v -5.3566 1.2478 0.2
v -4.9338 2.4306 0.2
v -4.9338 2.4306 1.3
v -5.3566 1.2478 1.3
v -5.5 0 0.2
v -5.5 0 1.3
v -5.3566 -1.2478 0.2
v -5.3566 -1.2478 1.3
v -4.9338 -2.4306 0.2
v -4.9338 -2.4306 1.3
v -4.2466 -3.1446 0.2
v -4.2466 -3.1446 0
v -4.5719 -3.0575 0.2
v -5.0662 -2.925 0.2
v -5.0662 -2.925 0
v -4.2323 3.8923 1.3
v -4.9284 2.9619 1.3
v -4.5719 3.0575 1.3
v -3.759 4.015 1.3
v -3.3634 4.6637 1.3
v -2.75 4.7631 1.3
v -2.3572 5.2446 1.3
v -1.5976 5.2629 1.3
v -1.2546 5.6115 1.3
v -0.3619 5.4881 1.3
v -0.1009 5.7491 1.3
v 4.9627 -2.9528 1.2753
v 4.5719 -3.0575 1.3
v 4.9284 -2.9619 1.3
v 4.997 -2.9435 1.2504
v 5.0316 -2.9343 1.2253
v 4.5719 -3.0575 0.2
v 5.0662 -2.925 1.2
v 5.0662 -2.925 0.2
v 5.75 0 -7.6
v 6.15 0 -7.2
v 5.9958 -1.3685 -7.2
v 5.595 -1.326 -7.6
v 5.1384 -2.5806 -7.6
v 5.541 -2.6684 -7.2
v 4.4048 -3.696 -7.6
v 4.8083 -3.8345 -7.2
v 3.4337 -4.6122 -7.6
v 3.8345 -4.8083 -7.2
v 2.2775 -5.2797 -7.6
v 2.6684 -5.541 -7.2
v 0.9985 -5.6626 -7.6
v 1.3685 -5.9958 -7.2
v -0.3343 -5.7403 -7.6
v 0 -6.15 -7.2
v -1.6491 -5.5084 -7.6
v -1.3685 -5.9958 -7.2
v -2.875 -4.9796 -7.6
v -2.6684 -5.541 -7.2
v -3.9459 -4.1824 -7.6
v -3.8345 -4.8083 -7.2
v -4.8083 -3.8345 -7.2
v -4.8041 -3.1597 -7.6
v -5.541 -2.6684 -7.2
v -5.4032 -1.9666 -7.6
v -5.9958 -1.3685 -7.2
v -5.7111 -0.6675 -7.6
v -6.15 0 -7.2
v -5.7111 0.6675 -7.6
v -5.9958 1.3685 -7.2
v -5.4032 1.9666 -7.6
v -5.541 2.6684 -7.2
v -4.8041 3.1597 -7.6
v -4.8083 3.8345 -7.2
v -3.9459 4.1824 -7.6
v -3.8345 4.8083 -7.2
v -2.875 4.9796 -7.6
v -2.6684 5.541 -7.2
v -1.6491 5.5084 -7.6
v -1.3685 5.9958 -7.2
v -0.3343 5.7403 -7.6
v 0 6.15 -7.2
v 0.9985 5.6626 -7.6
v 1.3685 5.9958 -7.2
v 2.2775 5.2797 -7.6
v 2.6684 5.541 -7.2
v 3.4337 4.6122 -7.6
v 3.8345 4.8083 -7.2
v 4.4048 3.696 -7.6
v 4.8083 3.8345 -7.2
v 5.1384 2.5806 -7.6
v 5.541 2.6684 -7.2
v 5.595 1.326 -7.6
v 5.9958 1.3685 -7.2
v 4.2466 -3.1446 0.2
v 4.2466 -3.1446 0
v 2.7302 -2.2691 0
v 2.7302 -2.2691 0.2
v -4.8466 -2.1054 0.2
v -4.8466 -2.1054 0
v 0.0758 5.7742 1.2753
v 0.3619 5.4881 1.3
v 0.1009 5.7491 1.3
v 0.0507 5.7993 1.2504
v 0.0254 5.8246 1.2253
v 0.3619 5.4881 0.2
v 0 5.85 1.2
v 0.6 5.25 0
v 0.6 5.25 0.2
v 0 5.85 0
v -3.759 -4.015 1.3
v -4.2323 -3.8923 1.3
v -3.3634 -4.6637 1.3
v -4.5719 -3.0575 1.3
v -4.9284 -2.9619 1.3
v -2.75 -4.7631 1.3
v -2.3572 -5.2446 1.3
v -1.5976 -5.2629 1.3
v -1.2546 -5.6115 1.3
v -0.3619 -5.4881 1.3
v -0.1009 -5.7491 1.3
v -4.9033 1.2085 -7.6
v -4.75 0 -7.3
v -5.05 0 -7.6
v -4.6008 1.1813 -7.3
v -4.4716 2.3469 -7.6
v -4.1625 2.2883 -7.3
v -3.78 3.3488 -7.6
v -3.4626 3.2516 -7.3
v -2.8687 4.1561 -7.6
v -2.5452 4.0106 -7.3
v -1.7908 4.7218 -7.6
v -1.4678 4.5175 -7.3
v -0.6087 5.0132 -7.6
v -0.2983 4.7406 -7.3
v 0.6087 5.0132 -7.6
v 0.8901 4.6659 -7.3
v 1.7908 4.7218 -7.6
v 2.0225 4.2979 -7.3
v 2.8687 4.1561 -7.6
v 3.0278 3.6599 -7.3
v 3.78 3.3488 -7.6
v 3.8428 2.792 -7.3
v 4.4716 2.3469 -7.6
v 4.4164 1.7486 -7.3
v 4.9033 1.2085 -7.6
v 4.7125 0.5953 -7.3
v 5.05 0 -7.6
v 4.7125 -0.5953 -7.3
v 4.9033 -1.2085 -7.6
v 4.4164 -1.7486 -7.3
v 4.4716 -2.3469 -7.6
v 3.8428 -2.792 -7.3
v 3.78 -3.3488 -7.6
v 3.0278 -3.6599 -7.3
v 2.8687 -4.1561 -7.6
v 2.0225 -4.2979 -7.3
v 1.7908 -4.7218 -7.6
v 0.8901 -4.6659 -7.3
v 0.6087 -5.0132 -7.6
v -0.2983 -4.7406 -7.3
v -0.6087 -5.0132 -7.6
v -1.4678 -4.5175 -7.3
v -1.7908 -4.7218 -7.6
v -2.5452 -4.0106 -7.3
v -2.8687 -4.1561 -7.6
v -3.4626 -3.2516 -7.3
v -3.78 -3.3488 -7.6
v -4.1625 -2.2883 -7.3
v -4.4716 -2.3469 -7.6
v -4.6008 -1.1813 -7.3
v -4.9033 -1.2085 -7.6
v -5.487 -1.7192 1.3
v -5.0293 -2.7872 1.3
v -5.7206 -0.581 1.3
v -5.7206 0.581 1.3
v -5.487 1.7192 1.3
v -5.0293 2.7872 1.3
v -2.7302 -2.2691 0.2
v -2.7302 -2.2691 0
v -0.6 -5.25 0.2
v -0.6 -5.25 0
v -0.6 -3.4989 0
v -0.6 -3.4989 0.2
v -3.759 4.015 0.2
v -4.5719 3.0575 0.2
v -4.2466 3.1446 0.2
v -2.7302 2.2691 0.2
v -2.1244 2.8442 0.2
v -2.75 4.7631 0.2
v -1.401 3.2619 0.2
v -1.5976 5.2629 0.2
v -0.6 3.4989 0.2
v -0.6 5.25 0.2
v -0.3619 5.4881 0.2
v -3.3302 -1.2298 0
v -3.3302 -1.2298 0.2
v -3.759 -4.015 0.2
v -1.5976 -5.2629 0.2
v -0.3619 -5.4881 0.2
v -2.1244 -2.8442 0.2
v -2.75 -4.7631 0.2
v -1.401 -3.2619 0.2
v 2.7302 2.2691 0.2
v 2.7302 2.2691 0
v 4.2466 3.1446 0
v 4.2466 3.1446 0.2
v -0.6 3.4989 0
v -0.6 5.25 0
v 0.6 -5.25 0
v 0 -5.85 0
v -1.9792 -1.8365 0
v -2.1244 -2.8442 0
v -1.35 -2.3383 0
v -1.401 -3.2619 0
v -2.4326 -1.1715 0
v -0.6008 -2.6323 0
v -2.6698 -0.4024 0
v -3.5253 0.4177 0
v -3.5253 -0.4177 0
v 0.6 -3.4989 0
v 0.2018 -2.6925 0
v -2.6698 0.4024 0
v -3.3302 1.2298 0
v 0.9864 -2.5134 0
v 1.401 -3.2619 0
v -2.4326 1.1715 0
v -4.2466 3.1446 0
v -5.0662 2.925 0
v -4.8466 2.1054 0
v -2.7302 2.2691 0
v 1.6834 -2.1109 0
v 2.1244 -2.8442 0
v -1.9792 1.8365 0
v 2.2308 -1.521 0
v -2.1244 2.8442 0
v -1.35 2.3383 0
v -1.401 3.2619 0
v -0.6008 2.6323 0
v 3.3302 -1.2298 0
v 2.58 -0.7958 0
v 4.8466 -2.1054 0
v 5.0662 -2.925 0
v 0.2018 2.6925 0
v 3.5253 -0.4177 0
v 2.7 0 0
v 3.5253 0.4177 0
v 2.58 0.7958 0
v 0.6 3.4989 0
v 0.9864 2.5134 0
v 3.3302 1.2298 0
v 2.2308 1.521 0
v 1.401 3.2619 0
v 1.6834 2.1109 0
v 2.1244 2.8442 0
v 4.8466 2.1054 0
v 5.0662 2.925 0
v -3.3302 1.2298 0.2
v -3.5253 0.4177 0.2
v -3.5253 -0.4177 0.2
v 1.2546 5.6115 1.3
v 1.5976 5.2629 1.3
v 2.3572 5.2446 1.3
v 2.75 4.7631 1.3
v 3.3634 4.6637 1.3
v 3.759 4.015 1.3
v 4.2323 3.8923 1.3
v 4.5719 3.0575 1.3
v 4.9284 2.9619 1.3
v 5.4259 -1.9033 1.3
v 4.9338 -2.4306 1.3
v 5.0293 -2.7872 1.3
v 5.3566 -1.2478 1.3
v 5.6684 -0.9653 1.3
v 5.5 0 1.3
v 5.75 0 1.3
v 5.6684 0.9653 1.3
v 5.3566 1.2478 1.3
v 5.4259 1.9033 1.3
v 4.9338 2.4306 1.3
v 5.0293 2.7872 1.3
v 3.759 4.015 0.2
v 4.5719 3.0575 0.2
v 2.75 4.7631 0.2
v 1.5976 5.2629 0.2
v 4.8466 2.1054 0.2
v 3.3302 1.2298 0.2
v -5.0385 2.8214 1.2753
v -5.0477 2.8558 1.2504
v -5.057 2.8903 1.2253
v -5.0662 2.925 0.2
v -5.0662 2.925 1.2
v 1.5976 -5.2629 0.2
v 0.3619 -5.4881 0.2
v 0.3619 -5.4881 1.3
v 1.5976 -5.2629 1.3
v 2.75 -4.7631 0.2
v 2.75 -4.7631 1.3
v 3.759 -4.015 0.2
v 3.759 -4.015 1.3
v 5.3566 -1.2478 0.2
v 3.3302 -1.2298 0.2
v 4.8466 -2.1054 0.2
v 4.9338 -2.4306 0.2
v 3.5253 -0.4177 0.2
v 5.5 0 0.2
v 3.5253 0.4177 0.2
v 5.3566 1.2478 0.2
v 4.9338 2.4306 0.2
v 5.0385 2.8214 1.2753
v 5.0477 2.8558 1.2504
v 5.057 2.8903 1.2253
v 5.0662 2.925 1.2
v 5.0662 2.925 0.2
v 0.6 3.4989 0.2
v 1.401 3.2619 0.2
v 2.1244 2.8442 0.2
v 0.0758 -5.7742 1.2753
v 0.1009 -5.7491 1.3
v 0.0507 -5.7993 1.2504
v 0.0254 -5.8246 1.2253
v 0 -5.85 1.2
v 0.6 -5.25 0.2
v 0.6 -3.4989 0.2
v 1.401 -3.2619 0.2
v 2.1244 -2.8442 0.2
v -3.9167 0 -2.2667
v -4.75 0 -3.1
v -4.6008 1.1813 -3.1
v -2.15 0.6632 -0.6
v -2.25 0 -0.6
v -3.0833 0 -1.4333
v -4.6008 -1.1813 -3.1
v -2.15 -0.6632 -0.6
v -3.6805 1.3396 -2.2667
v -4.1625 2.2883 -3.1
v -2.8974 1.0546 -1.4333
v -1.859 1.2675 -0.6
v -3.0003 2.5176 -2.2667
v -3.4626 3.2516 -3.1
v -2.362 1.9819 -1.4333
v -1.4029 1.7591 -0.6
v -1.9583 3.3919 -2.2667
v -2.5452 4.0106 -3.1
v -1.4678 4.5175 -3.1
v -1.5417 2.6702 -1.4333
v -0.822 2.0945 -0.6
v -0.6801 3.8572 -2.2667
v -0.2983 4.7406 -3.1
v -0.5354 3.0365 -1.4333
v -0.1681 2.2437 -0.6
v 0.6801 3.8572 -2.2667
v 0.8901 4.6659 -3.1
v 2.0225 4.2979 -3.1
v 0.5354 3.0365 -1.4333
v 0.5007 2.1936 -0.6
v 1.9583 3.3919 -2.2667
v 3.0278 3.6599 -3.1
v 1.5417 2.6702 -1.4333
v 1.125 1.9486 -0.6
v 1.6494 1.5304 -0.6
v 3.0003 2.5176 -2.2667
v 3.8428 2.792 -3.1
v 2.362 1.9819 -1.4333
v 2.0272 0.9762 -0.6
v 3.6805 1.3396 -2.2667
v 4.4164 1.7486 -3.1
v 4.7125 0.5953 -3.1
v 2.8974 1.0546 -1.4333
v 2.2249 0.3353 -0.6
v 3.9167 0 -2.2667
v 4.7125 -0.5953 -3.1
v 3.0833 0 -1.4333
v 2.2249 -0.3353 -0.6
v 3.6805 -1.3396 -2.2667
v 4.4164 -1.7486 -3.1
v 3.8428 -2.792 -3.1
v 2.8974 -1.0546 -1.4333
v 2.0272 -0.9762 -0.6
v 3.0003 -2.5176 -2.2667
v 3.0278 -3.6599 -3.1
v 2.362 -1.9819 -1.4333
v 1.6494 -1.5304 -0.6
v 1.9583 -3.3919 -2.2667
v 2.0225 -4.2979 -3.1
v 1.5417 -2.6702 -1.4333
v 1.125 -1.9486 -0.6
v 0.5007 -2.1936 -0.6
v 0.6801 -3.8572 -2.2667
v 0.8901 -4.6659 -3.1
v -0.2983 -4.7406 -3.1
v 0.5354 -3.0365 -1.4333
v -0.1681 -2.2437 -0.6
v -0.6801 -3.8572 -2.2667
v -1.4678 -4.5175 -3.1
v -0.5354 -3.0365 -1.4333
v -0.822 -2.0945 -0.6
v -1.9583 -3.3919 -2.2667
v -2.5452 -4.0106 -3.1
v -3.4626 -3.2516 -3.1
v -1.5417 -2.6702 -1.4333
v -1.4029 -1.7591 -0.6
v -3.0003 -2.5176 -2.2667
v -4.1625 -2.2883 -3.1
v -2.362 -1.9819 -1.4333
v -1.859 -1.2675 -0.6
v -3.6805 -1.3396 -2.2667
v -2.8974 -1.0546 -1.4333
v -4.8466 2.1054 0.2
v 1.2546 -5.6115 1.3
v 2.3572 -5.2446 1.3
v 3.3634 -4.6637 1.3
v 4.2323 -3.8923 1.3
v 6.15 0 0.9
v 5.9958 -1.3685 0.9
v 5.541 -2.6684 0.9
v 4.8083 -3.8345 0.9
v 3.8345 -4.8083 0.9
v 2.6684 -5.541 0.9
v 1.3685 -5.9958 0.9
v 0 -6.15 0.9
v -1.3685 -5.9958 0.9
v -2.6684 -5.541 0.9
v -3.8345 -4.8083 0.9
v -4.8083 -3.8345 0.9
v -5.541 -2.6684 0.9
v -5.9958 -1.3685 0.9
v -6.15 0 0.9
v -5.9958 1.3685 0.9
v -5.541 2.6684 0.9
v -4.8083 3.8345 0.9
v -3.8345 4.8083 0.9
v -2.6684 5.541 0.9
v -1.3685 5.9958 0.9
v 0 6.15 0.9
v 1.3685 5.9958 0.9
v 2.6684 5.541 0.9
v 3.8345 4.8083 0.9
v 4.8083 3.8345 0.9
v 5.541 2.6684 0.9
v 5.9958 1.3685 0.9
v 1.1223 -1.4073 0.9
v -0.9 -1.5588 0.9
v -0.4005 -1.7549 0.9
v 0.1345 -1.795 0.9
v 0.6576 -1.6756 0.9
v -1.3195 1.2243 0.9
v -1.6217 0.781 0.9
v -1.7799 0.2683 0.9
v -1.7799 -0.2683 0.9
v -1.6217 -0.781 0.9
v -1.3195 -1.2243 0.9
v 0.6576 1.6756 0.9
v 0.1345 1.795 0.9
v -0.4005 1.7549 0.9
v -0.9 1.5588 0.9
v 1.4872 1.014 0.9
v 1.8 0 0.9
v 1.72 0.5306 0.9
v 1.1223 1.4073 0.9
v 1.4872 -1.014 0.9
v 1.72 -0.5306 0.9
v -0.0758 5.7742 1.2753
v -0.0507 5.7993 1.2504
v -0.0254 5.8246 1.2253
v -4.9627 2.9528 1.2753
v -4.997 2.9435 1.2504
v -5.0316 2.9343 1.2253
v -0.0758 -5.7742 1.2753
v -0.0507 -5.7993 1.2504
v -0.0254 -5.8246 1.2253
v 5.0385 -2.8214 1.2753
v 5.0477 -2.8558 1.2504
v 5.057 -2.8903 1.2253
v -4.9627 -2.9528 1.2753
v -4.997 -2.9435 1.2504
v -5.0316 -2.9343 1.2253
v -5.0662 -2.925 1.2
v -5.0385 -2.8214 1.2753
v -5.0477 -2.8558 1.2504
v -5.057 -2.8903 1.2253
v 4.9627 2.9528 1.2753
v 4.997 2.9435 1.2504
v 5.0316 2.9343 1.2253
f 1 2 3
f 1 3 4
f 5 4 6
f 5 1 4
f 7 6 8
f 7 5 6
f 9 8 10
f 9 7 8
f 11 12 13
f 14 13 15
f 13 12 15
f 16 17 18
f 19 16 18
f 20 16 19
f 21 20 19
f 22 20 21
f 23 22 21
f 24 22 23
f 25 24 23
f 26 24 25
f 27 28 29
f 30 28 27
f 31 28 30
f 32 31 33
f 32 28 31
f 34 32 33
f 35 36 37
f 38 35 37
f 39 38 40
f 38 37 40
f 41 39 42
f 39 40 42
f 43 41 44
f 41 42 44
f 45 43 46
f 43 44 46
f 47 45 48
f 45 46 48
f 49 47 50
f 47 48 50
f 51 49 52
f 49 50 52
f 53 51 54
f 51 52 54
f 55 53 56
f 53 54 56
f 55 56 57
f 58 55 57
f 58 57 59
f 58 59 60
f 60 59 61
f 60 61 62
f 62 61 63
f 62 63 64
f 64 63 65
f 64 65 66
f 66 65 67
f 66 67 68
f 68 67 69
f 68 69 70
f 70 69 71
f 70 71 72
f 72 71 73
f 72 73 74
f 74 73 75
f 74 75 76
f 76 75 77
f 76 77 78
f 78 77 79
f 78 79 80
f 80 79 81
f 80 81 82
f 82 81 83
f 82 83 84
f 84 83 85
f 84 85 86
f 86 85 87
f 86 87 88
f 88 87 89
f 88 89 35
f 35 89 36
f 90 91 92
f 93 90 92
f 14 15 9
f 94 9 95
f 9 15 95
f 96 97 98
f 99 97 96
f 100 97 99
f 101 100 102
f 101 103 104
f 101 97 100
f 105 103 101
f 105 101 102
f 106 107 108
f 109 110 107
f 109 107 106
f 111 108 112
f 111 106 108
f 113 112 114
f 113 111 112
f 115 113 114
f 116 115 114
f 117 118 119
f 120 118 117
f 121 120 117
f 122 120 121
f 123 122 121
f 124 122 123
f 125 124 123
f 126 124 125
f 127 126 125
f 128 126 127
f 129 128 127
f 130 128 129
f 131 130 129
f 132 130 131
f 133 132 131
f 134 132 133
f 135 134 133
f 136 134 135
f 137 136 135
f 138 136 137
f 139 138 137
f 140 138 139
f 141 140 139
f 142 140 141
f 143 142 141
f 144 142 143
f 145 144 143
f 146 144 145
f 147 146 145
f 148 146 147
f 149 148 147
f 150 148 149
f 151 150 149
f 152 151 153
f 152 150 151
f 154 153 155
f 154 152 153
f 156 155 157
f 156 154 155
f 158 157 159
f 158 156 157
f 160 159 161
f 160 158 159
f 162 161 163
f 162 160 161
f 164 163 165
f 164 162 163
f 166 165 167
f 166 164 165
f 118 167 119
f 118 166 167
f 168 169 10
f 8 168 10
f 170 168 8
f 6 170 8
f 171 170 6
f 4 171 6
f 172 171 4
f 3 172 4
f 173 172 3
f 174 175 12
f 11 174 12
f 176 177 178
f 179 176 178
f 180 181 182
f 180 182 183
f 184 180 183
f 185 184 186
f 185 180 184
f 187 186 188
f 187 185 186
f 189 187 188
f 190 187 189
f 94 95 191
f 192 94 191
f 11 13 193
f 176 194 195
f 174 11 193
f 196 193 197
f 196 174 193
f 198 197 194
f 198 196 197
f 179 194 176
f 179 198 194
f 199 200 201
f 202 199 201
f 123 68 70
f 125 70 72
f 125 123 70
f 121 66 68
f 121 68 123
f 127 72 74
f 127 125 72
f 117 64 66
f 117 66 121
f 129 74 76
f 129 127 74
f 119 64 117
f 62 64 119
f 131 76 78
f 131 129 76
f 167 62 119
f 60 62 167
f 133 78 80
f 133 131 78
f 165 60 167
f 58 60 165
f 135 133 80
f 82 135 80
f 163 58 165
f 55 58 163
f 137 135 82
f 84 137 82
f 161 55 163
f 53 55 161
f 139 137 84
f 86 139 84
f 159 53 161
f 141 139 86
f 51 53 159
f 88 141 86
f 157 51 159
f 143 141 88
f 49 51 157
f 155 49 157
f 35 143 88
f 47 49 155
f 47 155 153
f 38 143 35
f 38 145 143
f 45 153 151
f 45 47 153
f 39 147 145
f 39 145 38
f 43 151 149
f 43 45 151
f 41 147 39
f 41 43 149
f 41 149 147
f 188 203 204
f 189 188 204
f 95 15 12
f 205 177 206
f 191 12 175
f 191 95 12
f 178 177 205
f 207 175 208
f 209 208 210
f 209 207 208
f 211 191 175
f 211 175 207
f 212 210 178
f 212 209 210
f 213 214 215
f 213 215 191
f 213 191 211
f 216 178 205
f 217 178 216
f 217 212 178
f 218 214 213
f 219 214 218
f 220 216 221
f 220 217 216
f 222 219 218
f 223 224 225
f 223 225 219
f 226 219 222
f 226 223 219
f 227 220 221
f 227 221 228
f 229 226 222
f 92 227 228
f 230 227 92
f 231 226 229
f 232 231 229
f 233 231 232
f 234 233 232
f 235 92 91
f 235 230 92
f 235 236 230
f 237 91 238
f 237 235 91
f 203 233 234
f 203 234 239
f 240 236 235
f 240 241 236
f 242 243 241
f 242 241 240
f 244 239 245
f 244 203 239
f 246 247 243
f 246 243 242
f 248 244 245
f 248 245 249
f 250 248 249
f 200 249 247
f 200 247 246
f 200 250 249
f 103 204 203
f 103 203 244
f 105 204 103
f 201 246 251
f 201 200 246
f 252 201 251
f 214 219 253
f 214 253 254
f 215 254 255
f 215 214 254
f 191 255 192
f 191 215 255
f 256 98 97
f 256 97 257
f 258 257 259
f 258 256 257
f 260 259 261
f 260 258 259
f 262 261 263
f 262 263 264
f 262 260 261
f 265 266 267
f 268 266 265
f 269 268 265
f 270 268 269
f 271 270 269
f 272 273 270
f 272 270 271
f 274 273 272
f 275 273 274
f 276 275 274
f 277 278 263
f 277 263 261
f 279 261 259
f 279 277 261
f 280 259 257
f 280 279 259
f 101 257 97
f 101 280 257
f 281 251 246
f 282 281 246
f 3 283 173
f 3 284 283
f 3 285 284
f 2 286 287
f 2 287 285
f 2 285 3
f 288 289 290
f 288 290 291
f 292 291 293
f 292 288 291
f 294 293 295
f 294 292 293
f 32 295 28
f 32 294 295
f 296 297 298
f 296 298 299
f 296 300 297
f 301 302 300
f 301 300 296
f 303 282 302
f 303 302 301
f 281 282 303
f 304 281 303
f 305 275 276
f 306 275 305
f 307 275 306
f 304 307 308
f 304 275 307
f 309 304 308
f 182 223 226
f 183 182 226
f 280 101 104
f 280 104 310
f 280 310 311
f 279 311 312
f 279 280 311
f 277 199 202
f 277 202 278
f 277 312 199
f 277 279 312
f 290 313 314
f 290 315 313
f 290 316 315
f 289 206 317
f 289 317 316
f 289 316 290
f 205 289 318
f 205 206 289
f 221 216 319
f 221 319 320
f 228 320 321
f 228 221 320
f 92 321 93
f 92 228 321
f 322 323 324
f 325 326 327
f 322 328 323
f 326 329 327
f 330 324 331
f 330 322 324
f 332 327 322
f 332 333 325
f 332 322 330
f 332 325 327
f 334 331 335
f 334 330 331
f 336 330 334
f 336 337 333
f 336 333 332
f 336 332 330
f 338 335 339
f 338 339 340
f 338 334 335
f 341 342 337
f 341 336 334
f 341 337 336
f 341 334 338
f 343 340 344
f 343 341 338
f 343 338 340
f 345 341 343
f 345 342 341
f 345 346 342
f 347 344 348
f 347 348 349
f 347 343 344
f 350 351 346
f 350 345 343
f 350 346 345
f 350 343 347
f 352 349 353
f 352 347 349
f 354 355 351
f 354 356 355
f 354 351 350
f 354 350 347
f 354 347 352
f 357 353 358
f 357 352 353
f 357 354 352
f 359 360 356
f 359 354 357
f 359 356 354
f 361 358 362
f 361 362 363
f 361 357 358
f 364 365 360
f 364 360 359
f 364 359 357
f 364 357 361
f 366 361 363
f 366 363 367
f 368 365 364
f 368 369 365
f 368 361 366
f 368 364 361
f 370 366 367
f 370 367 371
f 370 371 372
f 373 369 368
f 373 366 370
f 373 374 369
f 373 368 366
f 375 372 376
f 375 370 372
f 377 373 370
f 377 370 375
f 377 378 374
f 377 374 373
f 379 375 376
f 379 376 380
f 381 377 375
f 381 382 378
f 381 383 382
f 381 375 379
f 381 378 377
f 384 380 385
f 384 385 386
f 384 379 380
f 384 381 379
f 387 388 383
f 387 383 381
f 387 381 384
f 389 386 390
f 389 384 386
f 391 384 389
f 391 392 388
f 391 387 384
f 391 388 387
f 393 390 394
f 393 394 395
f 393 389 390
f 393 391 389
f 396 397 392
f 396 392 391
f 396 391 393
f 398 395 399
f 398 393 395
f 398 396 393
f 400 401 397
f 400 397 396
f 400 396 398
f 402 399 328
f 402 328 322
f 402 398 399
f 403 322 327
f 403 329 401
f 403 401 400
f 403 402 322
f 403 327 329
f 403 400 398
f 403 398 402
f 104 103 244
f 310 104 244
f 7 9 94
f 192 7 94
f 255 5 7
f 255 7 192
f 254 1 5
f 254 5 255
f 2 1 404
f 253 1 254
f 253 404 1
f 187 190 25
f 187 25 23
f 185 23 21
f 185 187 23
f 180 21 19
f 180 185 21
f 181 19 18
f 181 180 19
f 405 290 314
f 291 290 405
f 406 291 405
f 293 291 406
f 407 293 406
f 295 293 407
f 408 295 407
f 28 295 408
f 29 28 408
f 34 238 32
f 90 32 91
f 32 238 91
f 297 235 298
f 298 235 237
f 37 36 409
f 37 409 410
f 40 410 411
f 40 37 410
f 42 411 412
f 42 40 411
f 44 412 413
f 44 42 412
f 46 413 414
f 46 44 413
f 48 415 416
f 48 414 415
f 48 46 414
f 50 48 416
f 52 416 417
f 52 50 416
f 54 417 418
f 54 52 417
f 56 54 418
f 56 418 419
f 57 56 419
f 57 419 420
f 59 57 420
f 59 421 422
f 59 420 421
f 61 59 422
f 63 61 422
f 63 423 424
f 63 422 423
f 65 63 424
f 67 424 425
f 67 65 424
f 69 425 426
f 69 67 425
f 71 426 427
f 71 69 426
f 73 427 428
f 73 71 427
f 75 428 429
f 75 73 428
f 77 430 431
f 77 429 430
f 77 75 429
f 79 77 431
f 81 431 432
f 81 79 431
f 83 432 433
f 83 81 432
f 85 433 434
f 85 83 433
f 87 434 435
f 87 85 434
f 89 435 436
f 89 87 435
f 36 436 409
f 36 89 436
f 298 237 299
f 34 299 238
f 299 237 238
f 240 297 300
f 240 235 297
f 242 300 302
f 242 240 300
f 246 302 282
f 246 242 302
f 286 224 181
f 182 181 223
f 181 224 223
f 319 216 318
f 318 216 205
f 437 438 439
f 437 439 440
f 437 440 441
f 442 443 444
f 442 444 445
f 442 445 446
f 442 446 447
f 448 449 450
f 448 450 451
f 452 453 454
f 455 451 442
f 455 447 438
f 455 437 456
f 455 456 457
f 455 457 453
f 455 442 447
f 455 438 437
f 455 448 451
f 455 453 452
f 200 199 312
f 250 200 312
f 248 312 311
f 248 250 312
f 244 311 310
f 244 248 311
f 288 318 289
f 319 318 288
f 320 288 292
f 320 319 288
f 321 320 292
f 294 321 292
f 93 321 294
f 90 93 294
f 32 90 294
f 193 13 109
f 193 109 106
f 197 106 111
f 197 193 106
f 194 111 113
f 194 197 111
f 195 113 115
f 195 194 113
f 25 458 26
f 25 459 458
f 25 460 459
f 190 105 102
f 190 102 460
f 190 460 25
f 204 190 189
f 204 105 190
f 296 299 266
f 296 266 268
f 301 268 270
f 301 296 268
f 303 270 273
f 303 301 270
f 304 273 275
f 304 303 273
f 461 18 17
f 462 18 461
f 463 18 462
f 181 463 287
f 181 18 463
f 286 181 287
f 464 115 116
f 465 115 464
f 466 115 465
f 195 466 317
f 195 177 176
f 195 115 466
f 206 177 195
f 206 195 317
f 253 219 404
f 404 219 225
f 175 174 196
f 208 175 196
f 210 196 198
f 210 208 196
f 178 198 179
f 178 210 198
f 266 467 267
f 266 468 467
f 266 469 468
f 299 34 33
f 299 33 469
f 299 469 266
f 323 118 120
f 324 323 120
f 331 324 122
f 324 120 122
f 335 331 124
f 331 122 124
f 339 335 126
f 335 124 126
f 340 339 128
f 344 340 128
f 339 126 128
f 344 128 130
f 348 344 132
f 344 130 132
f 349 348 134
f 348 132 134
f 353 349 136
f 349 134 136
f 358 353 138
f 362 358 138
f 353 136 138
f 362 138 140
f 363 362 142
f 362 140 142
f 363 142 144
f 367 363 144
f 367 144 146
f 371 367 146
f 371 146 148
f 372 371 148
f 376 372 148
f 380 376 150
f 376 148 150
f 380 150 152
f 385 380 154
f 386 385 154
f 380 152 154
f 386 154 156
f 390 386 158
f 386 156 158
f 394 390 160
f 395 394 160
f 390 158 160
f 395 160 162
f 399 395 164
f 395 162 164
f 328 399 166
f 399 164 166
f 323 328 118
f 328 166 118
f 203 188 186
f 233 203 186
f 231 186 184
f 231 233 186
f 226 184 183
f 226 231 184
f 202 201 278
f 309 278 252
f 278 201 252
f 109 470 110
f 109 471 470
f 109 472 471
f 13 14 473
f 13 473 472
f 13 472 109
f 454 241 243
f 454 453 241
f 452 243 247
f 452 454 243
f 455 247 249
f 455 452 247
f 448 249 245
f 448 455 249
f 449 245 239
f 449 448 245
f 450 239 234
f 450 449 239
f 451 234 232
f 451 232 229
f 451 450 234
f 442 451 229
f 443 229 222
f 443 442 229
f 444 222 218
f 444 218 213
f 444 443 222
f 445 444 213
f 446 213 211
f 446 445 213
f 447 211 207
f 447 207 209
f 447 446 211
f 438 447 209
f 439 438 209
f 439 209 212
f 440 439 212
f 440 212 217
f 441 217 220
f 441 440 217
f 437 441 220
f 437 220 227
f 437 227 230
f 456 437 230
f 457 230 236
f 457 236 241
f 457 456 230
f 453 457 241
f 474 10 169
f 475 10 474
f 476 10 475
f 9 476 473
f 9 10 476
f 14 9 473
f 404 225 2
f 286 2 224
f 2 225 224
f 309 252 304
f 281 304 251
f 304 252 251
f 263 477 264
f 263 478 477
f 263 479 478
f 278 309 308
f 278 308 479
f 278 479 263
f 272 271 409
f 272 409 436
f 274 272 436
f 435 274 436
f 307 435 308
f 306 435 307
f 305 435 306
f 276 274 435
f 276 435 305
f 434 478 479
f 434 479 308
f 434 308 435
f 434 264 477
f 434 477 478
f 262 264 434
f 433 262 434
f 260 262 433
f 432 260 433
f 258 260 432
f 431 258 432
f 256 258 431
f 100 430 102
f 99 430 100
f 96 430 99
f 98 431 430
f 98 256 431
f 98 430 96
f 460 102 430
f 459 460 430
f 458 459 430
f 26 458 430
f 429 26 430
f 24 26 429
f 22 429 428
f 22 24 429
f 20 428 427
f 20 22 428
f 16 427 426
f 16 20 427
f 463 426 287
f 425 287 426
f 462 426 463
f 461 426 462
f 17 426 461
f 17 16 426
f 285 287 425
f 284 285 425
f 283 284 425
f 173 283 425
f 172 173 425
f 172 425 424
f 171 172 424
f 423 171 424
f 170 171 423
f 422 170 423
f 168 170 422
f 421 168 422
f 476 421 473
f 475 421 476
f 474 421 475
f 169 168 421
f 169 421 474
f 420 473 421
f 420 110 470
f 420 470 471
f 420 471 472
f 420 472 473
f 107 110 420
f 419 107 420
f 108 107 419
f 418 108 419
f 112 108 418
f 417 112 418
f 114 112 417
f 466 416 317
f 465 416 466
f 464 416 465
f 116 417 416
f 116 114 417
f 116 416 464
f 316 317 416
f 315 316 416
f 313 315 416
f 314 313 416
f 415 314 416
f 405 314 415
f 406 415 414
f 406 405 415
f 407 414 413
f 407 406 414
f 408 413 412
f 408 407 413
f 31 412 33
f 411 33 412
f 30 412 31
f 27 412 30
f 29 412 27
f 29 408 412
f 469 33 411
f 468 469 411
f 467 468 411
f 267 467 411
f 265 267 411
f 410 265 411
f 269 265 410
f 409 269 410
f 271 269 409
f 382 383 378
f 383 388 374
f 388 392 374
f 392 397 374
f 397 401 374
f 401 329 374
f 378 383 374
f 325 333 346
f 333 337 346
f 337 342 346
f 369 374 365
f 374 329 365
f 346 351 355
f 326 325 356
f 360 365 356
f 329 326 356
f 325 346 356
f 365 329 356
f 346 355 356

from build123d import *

# Parameters (mm, degrees)
SKETCH_1_R          = 6.15
EXTRUDE_1_DEPTH     = 0.2
SKETCH_2_R          = 2.8
EXTRUDE_2_DEPTH     = 0.9
SKETCH_3_R          = 6.15
EXTRUDE_3_DEPTH     = 1.1
EXTRUDE_START       = -0.6
SKETCH_4_R          = 6.15
EXTRUDE_4_DEPTH     = 0.6
CUT_EXTRUDE_START   = -0.2
SKETCH_6_R          = 3.55
SKETCH_6_R_2        = 2.8
CUT_EXTRUDE_2_DEPTH = 0.2
EXTRUDE_START_2     = 7
SKETCH_7_R          = 6.15
SKETCH_7_R_2        = 4.75
EXTRUDE_5_DEPTH     = 7
CHAMFER_4_SIZE      = 2.5
CHAMFER_5_SIZE      = 0.4
CHAMFER_6_SIZE      = 0.4
CHAMFER_7_SIZE      = 1
CHAMFER_8_SIZE      = 0.3


with BuildPart() as part:
    # 스케치1 → 보스-돌출1 (new body)
    with BuildSketch(Plane.XY):
        Circle(SKETCH_1_R)
        with BuildLine():
            Line((-0.6, 5.25), (0, 5.85))
            Line((0, 5.85), (0.6, 5.25))
            Line((0.6, 5.25), (0.6, 1.670516387))
            ThreePointArc((0.6, 1.670516387), (0.8875, 1.537195092), (1.146709629, 1.354873436))
            Line((1.146709629, 1.354873436), (4.24663337, 3.144615242))
            Line((4.24663337, 3.144615242), (5.066248612, 2.925))
            Line((5.066248612, 2.925), (4.84663337, 2.105384758))
            Line((4.84663337, 2.105384758), (1.746709629, 0.315642951))
            ThreePointArc((1.746709629, 0.315642951), (1.76791326, 0.158454108), (1.775, 0))
            ThreePointArc((1.775, 0), (1.76791326, -0.158454108), (1.746709629, -0.315642951))
            Line((1.746709629, -0.315642951), (4.84663337, -2.105384758))
            Line((4.84663337, -2.105384758), (5.066248612, -2.925))
            Line((5.066248612, -2.925), (4.24663337, -3.144615242))
            Line((4.24663337, -3.144615242), (1.146709629, -1.354873436))
            ThreePointArc((1.146709629, -1.354873436), (0.8875, -1.537195092), (0.6, -1.670516387))
            Line((0.6, -1.670516387), (0.6, -5.25))
            Line((0.6, -5.25), (0, -5.85))
            Line((0, -5.85), (-0.6, -5.25))
            Line((-0.6, -5.25), (-0.6, -1.670516387))
            ThreePointArc((-0.6, -1.670516387), (-0.8875, -1.537195092), (-1.146709629, -1.354873436))
            Line((-1.146709629, -1.354873436), (-4.24663337, -3.144615242))
            Line((-4.24663337, -3.144615242), (-5.066248612, -2.925))
            Line((-5.066248612, -2.925), (-4.84663337, -2.105384758))
            Line((-4.84663337, -2.105384758), (-1.746709629, -0.315642951))
            ThreePointArc((-1.746709629, -0.315642951), (-1.775, 0), (-1.746709629, 0.315642951))
            Line((-1.746709629, 0.315642951), (-4.84663337, 2.105384758))
            Line((-4.84663337, 2.105384758), (-5.066248612, 2.925))
            Line((-5.066248612, 2.925), (-4.24663337, 3.144615242))
            Line((-4.24663337, 3.144615242), (-1.146709629, 1.354873436))
            ThreePointArc((-1.146709629, 1.354873436), (-0.8875, 1.537195092), (-0.6, 1.670516387))
            Line((-0.6, 1.670516387), (-0.6, 5.25))
        make_face(mode=Mode.SUBTRACT)
    extrude(amount=EXTRUDE_1_DEPTH)

    # 스케치3 → 보스-돌출3 (add)
    with BuildSketch(Plane.XY.offset(0.2)):
        Circle(SKETCH_3_R)
        with BuildLine():
            Line((-4.933776406, -2.430606997), (-5.066248612, -2.925))
            Line((-5.066248612, -2.925), (-4.571855609, -3.057472206))
            ThreePointArc((-4.571855609, -3.057472206), (-2.75, -4.763139721), (-0.361920797, -5.488079203))
            Line((-0.361920797, -5.488079203), (0, -5.85))
            Line((0, -5.85), (0.361920797, -5.488079203))
            ThreePointArc((0.361920797, -5.488079203), (2.75, -4.763139721), (4.571855609, -3.057472206))
            Line((4.571855609, -3.057472206), (5.066248612, -2.925))
            Line((5.066248612, -2.925), (4.933776406, -2.430606997))
            ThreePointArc((4.933776406, -2.430606997), (5.5, 0), (4.933776406, 2.430606997))
            Line((4.933776406, 2.430606997), (5.066248612, 2.925))
            Line((5.066248612, 2.925), (4.571855609, 3.057472206))
            ThreePointArc((4.571855609, 3.057472206), (2.75, 4.763139721), (0.361920797, 5.488079203))
            Line((0.361920797, 5.488079203), (0, 5.85))
            Line((0, 5.85), (-0.361920797, 5.488079203))
            ThreePointArc((-0.361920797, 5.488079203), (-2.75, 4.763139721), (-4.571855609, 3.057472206))
            Line((-4.571855609, 3.057472206), (-5.066248612, 2.925))
            Line((-5.066248612, 2.925), (-4.933776406, 2.430606997))
            ThreePointArc((-4.933776406, 2.430606997), (-5.5, 0), (-4.933776406, -2.430606997))
        make_face(mode=Mode.SUBTRACT)
    extrude(amount=EXTRUDE_3_DEPTH)



with BuildPart() as body_2:
    # 스케치2 → 보스-돌출2 (new body)
    with BuildSketch(Plane.XY):
        Circle(SKETCH_2_R)
    extrude(amount=EXTRUDE_2_DEPTH)


with BuildPart() as part_1:
    add(part.part)

    add(body_2.part)  # 보스-돌출4 merges body 2
    # 스케치4 → 보스-돌출4 (add)
    with BuildSketch(Plane.XY.offset(EXTRUDE_START)):
        Circle(SKETCH_4_R)
    extrude(amount=EXTRUDE_4_DEPTH)

    # 스케치6 → 컷-돌출2 (cut)
    with BuildSketch(Plane.XY.offset(0.2).offset(CUT_EXTRUDE_START)):
        Circle(SKETCH_6_R)
        Circle(SKETCH_6_R_2, mode=Mode.SUBTRACT)
    extrude(amount=CUT_EXTRUDE_2_DEPTH, mode=Mode.SUBTRACT)

    # 스케치7 → 보스-돌출5 (add)
    with BuildSketch(Plane(origin=(0, 0, -0.6), x_dir=(-1, 0, 0), z_dir=(0, 0, -1)).offset(EXTRUDE_START_2)):
        with Locations(Location((0, 0, 0), (0, 0, 180))):
            Circle(SKETCH_7_R)
        Circle(SKETCH_7_R_2, mode=Mode.SUBTRACT)
    extrude(amount=-EXTRUDE_5_DEPTH)

    # 모따기4
    chamfer_4_edges = [part_1.edges().sort_by_distance(p)[0] for p in [
        (4.75, 0, -0.6),
    ]]
    chamfer(chamfer_4_edges, length=CHAMFER_4_SIZE)

    # 모따기5
    # the kernel refuses this chamfer: 0.4 mm, written as the material it takes off along each edge
    with BuildSketch(Plane(origin=(0, 0, 1.3), x_dir=(1, 0, 0), z_dir=(0, -1, 0))) as chamfer_5_piece_1:
        Polygon((6.15, -CHAMFER_5_SIZE), (6.15 - CHAMFER_5_SIZE, 0), (6.15, 0), align=None)
    revolve(axis=Axis((0, 0, 1.3), (0, 0, 1)), mode=Mode.SUBTRACT)

    # 모따기6
    chamfer_6_edges = [part_1.edges().sort_by_distance(p)[0] for p in [
        (-6.15, 0, -7.6),
    ]]
    chamfer(chamfer_6_edges, length=CHAMFER_6_SIZE)

    # 모따기7
    # the kernel refuses this chamfer: 1 mm, written as the material it takes off along each edge
    with BuildSketch(Plane(origin=(0, 0, 0.9), x_dir=(1, 0, 0), z_dir=(0, -1, 0))) as chamfer_7_piece_1_section:
        Polygon((2.8, -CHAMFER_7_SIZE), (2.8 - CHAMFER_7_SIZE, 0), (2.8, 0), align=None)
    chamfer_7_piece_1 = revolve(axis=Axis((0, 0, 0.9), (0, 0, 1)), mode=Mode.PRIVATE)
    chamfer_7_piece_1 = split(chamfer_7_piece_1, bisect_by=Plane(origin=(-2.250209939, 0, 0), z_dir=(0, 0, 1)), keep=Keep.TOP, mode=Mode.PRIVATE)
    add(chamfer_7_piece_1, mode=Mode.SUBTRACT)

    # 모따기8
    chamfer_8_edges = [part_1.edges().sort_by_distance(p)[0] for p in [
        (4.75, 0, -7.6),
    ]]
    chamfer(chamfer_8_edges, length=CHAMFER_8_SIZE)


solid = part_1.part
